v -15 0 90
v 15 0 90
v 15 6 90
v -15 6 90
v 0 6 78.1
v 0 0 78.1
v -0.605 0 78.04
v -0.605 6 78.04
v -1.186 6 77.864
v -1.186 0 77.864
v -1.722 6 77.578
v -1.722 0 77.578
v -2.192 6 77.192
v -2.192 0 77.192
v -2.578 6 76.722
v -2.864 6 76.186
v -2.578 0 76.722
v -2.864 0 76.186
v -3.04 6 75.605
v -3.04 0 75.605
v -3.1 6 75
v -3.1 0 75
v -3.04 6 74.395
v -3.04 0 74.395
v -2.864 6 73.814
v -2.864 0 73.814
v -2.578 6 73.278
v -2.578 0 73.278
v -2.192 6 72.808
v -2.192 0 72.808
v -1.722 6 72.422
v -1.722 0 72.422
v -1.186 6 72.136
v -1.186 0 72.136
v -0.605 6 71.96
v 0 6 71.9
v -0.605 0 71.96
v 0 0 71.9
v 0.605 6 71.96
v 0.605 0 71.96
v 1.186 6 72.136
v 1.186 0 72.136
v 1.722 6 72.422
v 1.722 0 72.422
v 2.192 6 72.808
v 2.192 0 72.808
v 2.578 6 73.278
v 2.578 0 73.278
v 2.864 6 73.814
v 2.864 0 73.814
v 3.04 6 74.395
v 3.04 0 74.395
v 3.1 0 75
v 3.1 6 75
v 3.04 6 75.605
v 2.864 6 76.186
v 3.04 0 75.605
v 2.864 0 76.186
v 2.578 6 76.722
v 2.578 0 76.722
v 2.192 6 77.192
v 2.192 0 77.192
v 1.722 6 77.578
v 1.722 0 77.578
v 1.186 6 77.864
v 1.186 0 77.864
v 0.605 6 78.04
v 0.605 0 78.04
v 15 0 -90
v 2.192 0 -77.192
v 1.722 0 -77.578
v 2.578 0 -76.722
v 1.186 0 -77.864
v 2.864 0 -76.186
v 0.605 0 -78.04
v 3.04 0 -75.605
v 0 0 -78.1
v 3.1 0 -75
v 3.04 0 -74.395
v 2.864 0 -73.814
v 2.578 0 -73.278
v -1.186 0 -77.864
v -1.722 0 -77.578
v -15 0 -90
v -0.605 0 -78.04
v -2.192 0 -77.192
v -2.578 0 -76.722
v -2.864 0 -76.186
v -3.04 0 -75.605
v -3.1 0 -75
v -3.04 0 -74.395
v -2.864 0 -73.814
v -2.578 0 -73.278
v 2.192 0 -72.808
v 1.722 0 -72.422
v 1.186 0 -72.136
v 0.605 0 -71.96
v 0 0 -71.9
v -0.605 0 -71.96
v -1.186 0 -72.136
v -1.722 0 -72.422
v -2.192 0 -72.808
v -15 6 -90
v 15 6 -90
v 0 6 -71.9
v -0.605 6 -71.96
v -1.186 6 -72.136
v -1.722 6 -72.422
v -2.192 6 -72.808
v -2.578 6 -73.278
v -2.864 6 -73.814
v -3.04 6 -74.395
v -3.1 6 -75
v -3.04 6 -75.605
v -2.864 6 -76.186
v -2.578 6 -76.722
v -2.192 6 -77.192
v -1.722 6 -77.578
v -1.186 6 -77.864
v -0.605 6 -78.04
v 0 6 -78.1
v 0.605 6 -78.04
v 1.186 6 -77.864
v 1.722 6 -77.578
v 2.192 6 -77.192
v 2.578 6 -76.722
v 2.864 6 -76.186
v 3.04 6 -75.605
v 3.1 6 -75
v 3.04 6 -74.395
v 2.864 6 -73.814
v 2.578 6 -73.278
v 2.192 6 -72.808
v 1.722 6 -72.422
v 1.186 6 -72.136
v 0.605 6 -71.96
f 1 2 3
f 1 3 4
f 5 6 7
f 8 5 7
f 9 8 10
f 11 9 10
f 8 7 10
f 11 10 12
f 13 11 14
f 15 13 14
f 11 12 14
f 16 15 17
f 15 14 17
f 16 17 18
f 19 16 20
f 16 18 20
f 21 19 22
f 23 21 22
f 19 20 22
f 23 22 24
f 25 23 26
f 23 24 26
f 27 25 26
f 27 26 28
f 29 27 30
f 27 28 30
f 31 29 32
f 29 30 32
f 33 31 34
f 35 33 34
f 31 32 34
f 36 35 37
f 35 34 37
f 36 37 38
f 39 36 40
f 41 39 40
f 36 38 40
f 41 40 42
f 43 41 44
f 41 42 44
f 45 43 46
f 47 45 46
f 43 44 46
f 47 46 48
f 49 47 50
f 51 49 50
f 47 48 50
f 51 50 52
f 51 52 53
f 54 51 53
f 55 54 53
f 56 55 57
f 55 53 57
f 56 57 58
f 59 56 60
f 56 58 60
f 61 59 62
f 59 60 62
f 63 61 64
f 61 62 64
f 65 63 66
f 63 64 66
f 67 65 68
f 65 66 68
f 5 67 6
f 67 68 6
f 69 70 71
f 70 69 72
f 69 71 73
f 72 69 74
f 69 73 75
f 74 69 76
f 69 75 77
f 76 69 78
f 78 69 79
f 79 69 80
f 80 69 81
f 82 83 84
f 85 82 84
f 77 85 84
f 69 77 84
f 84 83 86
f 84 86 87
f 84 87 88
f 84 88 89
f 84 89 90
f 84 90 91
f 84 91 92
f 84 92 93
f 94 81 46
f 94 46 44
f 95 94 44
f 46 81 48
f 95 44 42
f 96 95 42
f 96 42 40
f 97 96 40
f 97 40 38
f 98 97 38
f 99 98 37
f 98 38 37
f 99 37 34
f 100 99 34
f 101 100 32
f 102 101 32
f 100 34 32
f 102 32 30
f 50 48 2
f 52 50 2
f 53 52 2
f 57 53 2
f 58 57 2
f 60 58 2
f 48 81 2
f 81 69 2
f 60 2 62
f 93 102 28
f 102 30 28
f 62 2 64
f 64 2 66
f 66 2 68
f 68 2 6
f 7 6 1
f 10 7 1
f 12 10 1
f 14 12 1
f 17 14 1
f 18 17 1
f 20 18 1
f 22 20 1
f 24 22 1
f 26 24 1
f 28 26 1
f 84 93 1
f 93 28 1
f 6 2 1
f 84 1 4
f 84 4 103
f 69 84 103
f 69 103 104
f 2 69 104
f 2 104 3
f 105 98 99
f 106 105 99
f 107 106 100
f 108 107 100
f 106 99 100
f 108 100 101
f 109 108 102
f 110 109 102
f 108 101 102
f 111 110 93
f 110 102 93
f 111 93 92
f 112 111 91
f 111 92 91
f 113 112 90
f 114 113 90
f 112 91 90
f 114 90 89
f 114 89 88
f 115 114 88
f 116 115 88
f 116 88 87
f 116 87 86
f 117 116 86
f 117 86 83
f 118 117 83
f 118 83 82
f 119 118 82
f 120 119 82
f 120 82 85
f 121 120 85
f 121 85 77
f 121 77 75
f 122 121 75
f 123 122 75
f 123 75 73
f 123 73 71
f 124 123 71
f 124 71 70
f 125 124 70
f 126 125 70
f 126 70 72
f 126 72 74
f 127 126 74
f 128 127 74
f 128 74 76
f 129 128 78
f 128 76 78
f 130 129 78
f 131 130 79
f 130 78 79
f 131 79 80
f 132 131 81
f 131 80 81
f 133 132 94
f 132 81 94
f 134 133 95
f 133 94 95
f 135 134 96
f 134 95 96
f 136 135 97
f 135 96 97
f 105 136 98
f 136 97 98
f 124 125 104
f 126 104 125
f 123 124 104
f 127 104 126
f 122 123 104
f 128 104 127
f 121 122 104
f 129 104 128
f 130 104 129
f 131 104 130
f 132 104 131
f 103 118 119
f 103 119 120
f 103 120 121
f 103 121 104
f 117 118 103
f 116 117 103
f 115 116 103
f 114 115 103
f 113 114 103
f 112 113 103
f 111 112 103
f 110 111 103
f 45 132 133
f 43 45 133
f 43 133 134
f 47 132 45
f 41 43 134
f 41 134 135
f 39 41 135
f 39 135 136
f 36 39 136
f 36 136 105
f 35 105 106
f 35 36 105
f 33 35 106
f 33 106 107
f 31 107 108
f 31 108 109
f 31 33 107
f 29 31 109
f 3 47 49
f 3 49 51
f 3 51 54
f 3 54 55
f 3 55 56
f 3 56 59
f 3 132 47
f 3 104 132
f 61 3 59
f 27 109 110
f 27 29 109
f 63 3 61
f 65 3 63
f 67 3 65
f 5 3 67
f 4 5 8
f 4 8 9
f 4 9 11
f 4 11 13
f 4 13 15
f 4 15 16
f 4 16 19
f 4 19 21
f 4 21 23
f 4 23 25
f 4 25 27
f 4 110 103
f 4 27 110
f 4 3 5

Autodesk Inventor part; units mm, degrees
ref_plane "YZ Plane" through (0, 0, 0) normal (1, 0, 0) x (0, 1, 0)
ref_plane "XZ Plane" through (0, 0, 0) normal (0, 1, 0) x (-1, 0, 0)
ref_plane "XY Plane" through (0, 0, 0) normal (0, 0, 1) x (1, 0, 0)
sketch "Szkic1" plane through (0, 0, 0) normal (0, 1, 0) x (-1, 0, 0)
  line L0 (-15, 90) -> (15, 90)
  line L1 (15, 90) -> (15, -90)
  line L2 (15, -90) -> (-15, -90)
  line L3 (-15, -90) -> (-15, 90)
  line L4 (-15, 90) -> (15, -90) construction
  line L5 (15, 90) -> (-15, -90) construction
  point P0 (0, 0)
  dimension "d0" = 30
  dimension "d1" = 180
extrude "Wyciągnięcie proste1" add sketch "Szkic1" along normal blind 6
sketch "Szkic2" plane through (0, 6, 0) normal (0, 1, 0) x (1, 0, 0)
  line L0 (0, 0) -> (0, -75)
  line L1 (0, 0) -> (0, 75)
  dimension "d4" = 75
  dimension "d12" = 75
hole "Otwór1" at (0, 6, 75) at (0, 6, -75) direction (0, -1, 0) diameter 6.2 depth 33 tip angle 118
properties part number "łapa2"
